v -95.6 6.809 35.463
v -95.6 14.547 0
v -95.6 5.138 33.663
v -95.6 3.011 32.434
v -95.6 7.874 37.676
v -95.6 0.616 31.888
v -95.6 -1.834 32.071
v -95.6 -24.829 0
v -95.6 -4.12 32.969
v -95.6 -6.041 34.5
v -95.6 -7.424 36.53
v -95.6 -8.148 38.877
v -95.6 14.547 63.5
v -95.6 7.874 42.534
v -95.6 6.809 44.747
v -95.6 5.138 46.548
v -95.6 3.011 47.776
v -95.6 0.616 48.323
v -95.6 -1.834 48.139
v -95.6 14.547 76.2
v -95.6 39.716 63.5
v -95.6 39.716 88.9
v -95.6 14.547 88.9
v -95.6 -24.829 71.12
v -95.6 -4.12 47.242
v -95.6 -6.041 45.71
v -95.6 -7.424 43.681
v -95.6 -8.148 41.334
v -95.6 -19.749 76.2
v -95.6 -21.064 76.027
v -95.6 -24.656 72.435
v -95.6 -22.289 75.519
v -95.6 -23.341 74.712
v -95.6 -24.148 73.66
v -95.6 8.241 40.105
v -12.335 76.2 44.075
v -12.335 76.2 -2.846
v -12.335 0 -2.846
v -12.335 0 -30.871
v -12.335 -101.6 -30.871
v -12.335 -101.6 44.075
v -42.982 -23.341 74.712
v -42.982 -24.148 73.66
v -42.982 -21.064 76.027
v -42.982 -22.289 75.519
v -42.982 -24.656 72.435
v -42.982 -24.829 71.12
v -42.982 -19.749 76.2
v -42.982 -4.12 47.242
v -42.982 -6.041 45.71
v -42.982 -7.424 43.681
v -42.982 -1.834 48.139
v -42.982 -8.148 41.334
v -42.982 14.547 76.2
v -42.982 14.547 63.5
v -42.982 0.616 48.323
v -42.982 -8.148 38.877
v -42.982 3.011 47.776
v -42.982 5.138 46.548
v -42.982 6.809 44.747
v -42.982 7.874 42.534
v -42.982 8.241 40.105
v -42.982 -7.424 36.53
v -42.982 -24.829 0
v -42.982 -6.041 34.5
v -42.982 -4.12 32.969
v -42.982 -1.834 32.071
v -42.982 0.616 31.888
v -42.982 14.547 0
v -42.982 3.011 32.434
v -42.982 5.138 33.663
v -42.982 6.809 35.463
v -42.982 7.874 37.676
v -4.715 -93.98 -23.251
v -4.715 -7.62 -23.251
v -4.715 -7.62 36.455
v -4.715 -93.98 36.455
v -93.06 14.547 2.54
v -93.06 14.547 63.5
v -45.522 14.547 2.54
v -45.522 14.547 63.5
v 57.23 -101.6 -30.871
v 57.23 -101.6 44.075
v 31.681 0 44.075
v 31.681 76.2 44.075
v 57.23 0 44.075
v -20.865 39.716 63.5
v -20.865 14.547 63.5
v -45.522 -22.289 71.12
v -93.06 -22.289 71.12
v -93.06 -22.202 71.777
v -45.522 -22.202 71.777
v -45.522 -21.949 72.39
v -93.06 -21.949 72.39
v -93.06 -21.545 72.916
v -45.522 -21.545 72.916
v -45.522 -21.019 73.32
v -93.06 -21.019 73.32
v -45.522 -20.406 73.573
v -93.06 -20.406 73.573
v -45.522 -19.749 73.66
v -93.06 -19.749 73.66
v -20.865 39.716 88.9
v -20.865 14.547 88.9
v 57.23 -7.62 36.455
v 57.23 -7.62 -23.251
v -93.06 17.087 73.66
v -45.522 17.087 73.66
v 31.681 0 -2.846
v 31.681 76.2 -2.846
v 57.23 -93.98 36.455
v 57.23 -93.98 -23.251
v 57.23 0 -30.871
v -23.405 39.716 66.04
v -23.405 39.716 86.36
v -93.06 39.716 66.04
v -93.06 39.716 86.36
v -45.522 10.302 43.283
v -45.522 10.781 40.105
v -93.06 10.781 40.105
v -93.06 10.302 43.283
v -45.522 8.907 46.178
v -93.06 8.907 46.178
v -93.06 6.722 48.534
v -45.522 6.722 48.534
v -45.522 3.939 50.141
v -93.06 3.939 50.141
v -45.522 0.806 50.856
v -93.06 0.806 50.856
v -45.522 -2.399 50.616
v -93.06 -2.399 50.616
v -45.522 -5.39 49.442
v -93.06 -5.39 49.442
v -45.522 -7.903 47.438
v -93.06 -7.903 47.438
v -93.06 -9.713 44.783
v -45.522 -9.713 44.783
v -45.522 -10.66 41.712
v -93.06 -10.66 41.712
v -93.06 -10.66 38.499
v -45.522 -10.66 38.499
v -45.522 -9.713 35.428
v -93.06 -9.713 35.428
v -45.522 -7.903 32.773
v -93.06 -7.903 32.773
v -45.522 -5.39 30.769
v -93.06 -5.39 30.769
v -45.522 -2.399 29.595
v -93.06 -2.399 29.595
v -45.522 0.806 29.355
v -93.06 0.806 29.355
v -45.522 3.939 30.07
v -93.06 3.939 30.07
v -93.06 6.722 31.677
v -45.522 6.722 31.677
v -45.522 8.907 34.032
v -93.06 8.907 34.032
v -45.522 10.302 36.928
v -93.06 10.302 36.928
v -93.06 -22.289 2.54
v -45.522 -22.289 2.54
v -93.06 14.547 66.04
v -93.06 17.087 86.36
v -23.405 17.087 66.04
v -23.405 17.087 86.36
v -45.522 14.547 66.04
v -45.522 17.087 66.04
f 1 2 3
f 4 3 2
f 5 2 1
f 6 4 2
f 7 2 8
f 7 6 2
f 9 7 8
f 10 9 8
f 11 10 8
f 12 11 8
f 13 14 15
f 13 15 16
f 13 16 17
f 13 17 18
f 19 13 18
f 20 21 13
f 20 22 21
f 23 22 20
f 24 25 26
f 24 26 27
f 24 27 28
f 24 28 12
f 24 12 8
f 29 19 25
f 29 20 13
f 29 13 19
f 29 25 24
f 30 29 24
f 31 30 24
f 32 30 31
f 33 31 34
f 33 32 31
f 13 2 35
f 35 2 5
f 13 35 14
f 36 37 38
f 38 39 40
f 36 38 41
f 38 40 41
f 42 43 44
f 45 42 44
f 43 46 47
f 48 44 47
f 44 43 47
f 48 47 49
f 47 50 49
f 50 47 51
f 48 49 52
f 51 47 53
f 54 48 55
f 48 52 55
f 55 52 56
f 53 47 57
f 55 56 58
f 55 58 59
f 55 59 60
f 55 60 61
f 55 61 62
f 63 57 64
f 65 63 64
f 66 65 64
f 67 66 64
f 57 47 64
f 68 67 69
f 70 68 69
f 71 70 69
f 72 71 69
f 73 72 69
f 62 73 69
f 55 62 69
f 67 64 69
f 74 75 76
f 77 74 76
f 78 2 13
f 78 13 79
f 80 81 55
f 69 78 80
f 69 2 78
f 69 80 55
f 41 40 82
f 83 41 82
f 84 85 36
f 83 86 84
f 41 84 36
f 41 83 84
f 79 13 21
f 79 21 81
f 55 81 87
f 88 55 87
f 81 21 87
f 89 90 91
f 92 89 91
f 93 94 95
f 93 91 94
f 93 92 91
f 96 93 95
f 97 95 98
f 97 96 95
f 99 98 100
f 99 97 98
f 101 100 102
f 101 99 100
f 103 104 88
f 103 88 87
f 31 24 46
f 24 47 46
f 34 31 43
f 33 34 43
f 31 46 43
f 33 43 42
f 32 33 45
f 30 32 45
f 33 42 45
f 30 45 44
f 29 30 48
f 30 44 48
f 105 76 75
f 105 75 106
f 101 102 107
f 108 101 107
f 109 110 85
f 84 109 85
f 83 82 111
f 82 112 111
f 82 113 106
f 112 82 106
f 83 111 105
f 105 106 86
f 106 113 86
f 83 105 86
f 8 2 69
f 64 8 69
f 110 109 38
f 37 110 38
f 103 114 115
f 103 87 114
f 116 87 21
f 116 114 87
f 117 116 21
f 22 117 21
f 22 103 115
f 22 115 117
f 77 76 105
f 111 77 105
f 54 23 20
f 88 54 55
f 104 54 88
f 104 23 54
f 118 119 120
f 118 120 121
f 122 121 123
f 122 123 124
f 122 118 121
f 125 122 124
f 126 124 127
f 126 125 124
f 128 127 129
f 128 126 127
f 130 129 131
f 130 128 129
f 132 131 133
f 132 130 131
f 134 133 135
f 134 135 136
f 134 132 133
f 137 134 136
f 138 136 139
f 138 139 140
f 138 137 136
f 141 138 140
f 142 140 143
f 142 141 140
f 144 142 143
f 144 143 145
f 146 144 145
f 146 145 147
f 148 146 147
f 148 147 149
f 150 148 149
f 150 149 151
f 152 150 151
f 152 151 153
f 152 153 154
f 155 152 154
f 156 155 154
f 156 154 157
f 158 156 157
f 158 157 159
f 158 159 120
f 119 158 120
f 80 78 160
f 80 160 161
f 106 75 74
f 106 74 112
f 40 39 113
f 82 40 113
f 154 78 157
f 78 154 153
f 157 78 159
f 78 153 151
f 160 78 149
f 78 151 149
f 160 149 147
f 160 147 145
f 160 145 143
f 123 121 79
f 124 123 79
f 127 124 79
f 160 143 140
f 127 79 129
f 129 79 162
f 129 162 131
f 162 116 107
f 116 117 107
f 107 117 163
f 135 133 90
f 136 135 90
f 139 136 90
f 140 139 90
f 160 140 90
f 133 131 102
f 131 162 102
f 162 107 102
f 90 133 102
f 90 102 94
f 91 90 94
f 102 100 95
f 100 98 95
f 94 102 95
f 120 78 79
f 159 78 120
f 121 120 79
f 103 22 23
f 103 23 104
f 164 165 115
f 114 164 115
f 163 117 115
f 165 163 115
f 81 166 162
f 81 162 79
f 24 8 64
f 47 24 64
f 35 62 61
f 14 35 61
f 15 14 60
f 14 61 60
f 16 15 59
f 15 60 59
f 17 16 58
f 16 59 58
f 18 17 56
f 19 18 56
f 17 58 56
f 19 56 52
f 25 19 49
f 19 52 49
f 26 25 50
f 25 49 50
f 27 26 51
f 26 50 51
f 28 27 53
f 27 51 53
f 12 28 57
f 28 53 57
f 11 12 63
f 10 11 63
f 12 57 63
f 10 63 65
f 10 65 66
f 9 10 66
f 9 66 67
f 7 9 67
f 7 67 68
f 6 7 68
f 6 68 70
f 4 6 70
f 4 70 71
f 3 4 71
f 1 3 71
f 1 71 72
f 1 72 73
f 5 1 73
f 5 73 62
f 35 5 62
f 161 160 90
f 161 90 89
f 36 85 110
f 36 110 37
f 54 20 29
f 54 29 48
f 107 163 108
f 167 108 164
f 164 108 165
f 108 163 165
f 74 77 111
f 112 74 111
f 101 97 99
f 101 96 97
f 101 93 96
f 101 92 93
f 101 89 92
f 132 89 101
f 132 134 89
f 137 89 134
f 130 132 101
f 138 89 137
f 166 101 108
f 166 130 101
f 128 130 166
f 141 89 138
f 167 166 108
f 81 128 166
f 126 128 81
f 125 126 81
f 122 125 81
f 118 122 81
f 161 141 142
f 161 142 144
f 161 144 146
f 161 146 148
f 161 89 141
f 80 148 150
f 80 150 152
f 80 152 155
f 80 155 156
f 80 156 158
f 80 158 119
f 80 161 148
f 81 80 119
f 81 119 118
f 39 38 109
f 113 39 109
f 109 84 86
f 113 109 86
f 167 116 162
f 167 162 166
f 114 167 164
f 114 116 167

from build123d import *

# Parameters (mm, degrees)
F0_W        = 52.6178367436
F0_H        = 39.3761303276
F1_DEPTH    = 76.2
F2_R        = 5.08
F3_R        = 8.240513031
F4_DEPTH    = 52.6188367436
F6_DEPTH    = 12.7
F7_T        = 2.54
F7_T3_DEPTH = 57.6978367436
F7_T5_DEPTH = 17.78
F8_W        = 69.5647448301
F8_H        = 74.9455988407
F9_DEPTH    = 101.6
F10_T       = -7.62
F11_W       = 44.0154448152
F11_H       = 46.9202438835
F12_DEPTH   = 76.2


# Not quite as in the source:
# - a shell that OpenCascade refuses in one call is made with other operations: the cavity is built on its own and cut out


with BuildPart() as f1:
    # F0 (on Top) → F1 (new body)
    with BuildSketch(Plane.XY):
        with Locations((-69.2907851189, -5.140860565)):
            Rectangle(F0_W, F0_H)
    extrude(amount=F1_DEPTH)

    # F2
    f2_edges = [f1.edges().sort_by_distance(p)[0] for p in [
        (-69.290785, -24.828926, 76.2),
    ]]
    fillet(f2_edges, radius=F2_R)

    # F3 (on face) → F4 (cut, through all)
    with BuildSketch(Plane.YZ.offset(-42.9818667471)):
        with Locations((0, 40.1053540409)):
            Circle(F3_R)
    extrude(amount=-F4_DEPTH, mode=Mode.SUBTRACT)

    # F5 (on face) → F6 (join, symmetric)
    with BuildSketch(Plane.XY.offset(76.2)):
        Polygon((-95.5997034907, 39.7155843675), (-95.5997034907, 14.5472045988), (-42.9818667471, 14.5472045988), (-20.8651479334, 14.5472045988), (-20.8651479334, 39.7155843675), align=None)
    extrude(amount=F6_DEPTH, both=True)

    # F7: shell of thickness 2.54, made by hand


with BuildPart() as f7_core1:
    # F7_t2: copy of F1
    add(f1.part)

    # the walls: a layer under each face that stays
    f7_faces = [f7_core1.faces().sort_by_distance(p)[0] for p in [
        (-95.5997034907, 7.4433293194, 44.45),
        (-69.2907851189, -24.8289257288, 35.56),
        (-69.2907851189, -23.3410281772, 74.7121024484),
        (-69.2907851189, -5.140860565, 0),
        (-69.2907851189, -2.600860565, 76.2),
        (-69.2907851189, -8.240513031, 40.1053540409),
        (-42.9818667471, -18.2662373409, 63.5),
        (-83.1439442312, 14.5472045988, 84.6666666667),
        (-58.232425712, 27.1313944831, 63.5),
        (-58.232425712, 27.1313944831, 88.9),
        (-20.8651479334, 27.1313944831, 76.2),
    ]]
    thicken(f7_faces, amount=-F7_T, mode=Mode.SUBTRACT)

    # F7_s4 → F7_t3 (cut)
    with BuildSketch(Plane.YZ.offset(-98.1397034907)):
        Polygon((14.5218045988, 76.2254), (14.5472045988, 73.66), (17.0872045988, 73.66), (17.0872045988, 76.2), align=None)
    extrude(amount=F7_T3_DEPTH, mode=Mode.SUBTRACT)

    # F7_s6 → F7_t5 (cut)
    with BuildSketch(Plane.XY.offset(60.96)):
        Polygon((-42.9564667471, 14.5218045988), (-45.5218667471, 14.5472045988), (-45.5218667471, 17.0872045988), (-42.9818667471, 17.0872045988), align=None)
    extrude(amount=F7_T5_DEPTH, mode=Mode.SUBTRACT)


with BuildPart() as f1_1:
    add(f1.part)

    # what is left inside the walls is the cavity
    f7_cavity = [f7_core1.part.solids().sort_by_distance(p)[0] for p in [
        (-69.290785, -22.263526, 48.26),
    ]]
    add(f7_cavity, mode=Mode.SUBTRACT)


with BuildPart() as f9:
    # F8 (on Front) → F9 (new body)
    with BuildSketch(Plane.XZ):
        with Locations((22.4474929273, 6.6017955542)):
            Rectangle(F8_W, F8_H)
    extrude(amount=F9_DEPTH)

    # F10
    f10_openings = [f9.faces().sort_by_distance(p)[0] for p in [
        (57.229865, -50.8, 6.601796),
    ]]
    offset(amount=F10_T, openings=f10_openings)

    # F11 (on face) → F12 (join)
    with BuildSketch(Plane(origin=(0, 0, 0), x_dir=(-1, 0, 0), z_dir=(0, 1, 0))):
        with Locations((-9.6728429198, 20.6144730328)):
            Rectangle(F11_W, F11_H)
    extrude(amount=F12_DEPTH)


solid = Compound([f1_1.part, f9.part])
